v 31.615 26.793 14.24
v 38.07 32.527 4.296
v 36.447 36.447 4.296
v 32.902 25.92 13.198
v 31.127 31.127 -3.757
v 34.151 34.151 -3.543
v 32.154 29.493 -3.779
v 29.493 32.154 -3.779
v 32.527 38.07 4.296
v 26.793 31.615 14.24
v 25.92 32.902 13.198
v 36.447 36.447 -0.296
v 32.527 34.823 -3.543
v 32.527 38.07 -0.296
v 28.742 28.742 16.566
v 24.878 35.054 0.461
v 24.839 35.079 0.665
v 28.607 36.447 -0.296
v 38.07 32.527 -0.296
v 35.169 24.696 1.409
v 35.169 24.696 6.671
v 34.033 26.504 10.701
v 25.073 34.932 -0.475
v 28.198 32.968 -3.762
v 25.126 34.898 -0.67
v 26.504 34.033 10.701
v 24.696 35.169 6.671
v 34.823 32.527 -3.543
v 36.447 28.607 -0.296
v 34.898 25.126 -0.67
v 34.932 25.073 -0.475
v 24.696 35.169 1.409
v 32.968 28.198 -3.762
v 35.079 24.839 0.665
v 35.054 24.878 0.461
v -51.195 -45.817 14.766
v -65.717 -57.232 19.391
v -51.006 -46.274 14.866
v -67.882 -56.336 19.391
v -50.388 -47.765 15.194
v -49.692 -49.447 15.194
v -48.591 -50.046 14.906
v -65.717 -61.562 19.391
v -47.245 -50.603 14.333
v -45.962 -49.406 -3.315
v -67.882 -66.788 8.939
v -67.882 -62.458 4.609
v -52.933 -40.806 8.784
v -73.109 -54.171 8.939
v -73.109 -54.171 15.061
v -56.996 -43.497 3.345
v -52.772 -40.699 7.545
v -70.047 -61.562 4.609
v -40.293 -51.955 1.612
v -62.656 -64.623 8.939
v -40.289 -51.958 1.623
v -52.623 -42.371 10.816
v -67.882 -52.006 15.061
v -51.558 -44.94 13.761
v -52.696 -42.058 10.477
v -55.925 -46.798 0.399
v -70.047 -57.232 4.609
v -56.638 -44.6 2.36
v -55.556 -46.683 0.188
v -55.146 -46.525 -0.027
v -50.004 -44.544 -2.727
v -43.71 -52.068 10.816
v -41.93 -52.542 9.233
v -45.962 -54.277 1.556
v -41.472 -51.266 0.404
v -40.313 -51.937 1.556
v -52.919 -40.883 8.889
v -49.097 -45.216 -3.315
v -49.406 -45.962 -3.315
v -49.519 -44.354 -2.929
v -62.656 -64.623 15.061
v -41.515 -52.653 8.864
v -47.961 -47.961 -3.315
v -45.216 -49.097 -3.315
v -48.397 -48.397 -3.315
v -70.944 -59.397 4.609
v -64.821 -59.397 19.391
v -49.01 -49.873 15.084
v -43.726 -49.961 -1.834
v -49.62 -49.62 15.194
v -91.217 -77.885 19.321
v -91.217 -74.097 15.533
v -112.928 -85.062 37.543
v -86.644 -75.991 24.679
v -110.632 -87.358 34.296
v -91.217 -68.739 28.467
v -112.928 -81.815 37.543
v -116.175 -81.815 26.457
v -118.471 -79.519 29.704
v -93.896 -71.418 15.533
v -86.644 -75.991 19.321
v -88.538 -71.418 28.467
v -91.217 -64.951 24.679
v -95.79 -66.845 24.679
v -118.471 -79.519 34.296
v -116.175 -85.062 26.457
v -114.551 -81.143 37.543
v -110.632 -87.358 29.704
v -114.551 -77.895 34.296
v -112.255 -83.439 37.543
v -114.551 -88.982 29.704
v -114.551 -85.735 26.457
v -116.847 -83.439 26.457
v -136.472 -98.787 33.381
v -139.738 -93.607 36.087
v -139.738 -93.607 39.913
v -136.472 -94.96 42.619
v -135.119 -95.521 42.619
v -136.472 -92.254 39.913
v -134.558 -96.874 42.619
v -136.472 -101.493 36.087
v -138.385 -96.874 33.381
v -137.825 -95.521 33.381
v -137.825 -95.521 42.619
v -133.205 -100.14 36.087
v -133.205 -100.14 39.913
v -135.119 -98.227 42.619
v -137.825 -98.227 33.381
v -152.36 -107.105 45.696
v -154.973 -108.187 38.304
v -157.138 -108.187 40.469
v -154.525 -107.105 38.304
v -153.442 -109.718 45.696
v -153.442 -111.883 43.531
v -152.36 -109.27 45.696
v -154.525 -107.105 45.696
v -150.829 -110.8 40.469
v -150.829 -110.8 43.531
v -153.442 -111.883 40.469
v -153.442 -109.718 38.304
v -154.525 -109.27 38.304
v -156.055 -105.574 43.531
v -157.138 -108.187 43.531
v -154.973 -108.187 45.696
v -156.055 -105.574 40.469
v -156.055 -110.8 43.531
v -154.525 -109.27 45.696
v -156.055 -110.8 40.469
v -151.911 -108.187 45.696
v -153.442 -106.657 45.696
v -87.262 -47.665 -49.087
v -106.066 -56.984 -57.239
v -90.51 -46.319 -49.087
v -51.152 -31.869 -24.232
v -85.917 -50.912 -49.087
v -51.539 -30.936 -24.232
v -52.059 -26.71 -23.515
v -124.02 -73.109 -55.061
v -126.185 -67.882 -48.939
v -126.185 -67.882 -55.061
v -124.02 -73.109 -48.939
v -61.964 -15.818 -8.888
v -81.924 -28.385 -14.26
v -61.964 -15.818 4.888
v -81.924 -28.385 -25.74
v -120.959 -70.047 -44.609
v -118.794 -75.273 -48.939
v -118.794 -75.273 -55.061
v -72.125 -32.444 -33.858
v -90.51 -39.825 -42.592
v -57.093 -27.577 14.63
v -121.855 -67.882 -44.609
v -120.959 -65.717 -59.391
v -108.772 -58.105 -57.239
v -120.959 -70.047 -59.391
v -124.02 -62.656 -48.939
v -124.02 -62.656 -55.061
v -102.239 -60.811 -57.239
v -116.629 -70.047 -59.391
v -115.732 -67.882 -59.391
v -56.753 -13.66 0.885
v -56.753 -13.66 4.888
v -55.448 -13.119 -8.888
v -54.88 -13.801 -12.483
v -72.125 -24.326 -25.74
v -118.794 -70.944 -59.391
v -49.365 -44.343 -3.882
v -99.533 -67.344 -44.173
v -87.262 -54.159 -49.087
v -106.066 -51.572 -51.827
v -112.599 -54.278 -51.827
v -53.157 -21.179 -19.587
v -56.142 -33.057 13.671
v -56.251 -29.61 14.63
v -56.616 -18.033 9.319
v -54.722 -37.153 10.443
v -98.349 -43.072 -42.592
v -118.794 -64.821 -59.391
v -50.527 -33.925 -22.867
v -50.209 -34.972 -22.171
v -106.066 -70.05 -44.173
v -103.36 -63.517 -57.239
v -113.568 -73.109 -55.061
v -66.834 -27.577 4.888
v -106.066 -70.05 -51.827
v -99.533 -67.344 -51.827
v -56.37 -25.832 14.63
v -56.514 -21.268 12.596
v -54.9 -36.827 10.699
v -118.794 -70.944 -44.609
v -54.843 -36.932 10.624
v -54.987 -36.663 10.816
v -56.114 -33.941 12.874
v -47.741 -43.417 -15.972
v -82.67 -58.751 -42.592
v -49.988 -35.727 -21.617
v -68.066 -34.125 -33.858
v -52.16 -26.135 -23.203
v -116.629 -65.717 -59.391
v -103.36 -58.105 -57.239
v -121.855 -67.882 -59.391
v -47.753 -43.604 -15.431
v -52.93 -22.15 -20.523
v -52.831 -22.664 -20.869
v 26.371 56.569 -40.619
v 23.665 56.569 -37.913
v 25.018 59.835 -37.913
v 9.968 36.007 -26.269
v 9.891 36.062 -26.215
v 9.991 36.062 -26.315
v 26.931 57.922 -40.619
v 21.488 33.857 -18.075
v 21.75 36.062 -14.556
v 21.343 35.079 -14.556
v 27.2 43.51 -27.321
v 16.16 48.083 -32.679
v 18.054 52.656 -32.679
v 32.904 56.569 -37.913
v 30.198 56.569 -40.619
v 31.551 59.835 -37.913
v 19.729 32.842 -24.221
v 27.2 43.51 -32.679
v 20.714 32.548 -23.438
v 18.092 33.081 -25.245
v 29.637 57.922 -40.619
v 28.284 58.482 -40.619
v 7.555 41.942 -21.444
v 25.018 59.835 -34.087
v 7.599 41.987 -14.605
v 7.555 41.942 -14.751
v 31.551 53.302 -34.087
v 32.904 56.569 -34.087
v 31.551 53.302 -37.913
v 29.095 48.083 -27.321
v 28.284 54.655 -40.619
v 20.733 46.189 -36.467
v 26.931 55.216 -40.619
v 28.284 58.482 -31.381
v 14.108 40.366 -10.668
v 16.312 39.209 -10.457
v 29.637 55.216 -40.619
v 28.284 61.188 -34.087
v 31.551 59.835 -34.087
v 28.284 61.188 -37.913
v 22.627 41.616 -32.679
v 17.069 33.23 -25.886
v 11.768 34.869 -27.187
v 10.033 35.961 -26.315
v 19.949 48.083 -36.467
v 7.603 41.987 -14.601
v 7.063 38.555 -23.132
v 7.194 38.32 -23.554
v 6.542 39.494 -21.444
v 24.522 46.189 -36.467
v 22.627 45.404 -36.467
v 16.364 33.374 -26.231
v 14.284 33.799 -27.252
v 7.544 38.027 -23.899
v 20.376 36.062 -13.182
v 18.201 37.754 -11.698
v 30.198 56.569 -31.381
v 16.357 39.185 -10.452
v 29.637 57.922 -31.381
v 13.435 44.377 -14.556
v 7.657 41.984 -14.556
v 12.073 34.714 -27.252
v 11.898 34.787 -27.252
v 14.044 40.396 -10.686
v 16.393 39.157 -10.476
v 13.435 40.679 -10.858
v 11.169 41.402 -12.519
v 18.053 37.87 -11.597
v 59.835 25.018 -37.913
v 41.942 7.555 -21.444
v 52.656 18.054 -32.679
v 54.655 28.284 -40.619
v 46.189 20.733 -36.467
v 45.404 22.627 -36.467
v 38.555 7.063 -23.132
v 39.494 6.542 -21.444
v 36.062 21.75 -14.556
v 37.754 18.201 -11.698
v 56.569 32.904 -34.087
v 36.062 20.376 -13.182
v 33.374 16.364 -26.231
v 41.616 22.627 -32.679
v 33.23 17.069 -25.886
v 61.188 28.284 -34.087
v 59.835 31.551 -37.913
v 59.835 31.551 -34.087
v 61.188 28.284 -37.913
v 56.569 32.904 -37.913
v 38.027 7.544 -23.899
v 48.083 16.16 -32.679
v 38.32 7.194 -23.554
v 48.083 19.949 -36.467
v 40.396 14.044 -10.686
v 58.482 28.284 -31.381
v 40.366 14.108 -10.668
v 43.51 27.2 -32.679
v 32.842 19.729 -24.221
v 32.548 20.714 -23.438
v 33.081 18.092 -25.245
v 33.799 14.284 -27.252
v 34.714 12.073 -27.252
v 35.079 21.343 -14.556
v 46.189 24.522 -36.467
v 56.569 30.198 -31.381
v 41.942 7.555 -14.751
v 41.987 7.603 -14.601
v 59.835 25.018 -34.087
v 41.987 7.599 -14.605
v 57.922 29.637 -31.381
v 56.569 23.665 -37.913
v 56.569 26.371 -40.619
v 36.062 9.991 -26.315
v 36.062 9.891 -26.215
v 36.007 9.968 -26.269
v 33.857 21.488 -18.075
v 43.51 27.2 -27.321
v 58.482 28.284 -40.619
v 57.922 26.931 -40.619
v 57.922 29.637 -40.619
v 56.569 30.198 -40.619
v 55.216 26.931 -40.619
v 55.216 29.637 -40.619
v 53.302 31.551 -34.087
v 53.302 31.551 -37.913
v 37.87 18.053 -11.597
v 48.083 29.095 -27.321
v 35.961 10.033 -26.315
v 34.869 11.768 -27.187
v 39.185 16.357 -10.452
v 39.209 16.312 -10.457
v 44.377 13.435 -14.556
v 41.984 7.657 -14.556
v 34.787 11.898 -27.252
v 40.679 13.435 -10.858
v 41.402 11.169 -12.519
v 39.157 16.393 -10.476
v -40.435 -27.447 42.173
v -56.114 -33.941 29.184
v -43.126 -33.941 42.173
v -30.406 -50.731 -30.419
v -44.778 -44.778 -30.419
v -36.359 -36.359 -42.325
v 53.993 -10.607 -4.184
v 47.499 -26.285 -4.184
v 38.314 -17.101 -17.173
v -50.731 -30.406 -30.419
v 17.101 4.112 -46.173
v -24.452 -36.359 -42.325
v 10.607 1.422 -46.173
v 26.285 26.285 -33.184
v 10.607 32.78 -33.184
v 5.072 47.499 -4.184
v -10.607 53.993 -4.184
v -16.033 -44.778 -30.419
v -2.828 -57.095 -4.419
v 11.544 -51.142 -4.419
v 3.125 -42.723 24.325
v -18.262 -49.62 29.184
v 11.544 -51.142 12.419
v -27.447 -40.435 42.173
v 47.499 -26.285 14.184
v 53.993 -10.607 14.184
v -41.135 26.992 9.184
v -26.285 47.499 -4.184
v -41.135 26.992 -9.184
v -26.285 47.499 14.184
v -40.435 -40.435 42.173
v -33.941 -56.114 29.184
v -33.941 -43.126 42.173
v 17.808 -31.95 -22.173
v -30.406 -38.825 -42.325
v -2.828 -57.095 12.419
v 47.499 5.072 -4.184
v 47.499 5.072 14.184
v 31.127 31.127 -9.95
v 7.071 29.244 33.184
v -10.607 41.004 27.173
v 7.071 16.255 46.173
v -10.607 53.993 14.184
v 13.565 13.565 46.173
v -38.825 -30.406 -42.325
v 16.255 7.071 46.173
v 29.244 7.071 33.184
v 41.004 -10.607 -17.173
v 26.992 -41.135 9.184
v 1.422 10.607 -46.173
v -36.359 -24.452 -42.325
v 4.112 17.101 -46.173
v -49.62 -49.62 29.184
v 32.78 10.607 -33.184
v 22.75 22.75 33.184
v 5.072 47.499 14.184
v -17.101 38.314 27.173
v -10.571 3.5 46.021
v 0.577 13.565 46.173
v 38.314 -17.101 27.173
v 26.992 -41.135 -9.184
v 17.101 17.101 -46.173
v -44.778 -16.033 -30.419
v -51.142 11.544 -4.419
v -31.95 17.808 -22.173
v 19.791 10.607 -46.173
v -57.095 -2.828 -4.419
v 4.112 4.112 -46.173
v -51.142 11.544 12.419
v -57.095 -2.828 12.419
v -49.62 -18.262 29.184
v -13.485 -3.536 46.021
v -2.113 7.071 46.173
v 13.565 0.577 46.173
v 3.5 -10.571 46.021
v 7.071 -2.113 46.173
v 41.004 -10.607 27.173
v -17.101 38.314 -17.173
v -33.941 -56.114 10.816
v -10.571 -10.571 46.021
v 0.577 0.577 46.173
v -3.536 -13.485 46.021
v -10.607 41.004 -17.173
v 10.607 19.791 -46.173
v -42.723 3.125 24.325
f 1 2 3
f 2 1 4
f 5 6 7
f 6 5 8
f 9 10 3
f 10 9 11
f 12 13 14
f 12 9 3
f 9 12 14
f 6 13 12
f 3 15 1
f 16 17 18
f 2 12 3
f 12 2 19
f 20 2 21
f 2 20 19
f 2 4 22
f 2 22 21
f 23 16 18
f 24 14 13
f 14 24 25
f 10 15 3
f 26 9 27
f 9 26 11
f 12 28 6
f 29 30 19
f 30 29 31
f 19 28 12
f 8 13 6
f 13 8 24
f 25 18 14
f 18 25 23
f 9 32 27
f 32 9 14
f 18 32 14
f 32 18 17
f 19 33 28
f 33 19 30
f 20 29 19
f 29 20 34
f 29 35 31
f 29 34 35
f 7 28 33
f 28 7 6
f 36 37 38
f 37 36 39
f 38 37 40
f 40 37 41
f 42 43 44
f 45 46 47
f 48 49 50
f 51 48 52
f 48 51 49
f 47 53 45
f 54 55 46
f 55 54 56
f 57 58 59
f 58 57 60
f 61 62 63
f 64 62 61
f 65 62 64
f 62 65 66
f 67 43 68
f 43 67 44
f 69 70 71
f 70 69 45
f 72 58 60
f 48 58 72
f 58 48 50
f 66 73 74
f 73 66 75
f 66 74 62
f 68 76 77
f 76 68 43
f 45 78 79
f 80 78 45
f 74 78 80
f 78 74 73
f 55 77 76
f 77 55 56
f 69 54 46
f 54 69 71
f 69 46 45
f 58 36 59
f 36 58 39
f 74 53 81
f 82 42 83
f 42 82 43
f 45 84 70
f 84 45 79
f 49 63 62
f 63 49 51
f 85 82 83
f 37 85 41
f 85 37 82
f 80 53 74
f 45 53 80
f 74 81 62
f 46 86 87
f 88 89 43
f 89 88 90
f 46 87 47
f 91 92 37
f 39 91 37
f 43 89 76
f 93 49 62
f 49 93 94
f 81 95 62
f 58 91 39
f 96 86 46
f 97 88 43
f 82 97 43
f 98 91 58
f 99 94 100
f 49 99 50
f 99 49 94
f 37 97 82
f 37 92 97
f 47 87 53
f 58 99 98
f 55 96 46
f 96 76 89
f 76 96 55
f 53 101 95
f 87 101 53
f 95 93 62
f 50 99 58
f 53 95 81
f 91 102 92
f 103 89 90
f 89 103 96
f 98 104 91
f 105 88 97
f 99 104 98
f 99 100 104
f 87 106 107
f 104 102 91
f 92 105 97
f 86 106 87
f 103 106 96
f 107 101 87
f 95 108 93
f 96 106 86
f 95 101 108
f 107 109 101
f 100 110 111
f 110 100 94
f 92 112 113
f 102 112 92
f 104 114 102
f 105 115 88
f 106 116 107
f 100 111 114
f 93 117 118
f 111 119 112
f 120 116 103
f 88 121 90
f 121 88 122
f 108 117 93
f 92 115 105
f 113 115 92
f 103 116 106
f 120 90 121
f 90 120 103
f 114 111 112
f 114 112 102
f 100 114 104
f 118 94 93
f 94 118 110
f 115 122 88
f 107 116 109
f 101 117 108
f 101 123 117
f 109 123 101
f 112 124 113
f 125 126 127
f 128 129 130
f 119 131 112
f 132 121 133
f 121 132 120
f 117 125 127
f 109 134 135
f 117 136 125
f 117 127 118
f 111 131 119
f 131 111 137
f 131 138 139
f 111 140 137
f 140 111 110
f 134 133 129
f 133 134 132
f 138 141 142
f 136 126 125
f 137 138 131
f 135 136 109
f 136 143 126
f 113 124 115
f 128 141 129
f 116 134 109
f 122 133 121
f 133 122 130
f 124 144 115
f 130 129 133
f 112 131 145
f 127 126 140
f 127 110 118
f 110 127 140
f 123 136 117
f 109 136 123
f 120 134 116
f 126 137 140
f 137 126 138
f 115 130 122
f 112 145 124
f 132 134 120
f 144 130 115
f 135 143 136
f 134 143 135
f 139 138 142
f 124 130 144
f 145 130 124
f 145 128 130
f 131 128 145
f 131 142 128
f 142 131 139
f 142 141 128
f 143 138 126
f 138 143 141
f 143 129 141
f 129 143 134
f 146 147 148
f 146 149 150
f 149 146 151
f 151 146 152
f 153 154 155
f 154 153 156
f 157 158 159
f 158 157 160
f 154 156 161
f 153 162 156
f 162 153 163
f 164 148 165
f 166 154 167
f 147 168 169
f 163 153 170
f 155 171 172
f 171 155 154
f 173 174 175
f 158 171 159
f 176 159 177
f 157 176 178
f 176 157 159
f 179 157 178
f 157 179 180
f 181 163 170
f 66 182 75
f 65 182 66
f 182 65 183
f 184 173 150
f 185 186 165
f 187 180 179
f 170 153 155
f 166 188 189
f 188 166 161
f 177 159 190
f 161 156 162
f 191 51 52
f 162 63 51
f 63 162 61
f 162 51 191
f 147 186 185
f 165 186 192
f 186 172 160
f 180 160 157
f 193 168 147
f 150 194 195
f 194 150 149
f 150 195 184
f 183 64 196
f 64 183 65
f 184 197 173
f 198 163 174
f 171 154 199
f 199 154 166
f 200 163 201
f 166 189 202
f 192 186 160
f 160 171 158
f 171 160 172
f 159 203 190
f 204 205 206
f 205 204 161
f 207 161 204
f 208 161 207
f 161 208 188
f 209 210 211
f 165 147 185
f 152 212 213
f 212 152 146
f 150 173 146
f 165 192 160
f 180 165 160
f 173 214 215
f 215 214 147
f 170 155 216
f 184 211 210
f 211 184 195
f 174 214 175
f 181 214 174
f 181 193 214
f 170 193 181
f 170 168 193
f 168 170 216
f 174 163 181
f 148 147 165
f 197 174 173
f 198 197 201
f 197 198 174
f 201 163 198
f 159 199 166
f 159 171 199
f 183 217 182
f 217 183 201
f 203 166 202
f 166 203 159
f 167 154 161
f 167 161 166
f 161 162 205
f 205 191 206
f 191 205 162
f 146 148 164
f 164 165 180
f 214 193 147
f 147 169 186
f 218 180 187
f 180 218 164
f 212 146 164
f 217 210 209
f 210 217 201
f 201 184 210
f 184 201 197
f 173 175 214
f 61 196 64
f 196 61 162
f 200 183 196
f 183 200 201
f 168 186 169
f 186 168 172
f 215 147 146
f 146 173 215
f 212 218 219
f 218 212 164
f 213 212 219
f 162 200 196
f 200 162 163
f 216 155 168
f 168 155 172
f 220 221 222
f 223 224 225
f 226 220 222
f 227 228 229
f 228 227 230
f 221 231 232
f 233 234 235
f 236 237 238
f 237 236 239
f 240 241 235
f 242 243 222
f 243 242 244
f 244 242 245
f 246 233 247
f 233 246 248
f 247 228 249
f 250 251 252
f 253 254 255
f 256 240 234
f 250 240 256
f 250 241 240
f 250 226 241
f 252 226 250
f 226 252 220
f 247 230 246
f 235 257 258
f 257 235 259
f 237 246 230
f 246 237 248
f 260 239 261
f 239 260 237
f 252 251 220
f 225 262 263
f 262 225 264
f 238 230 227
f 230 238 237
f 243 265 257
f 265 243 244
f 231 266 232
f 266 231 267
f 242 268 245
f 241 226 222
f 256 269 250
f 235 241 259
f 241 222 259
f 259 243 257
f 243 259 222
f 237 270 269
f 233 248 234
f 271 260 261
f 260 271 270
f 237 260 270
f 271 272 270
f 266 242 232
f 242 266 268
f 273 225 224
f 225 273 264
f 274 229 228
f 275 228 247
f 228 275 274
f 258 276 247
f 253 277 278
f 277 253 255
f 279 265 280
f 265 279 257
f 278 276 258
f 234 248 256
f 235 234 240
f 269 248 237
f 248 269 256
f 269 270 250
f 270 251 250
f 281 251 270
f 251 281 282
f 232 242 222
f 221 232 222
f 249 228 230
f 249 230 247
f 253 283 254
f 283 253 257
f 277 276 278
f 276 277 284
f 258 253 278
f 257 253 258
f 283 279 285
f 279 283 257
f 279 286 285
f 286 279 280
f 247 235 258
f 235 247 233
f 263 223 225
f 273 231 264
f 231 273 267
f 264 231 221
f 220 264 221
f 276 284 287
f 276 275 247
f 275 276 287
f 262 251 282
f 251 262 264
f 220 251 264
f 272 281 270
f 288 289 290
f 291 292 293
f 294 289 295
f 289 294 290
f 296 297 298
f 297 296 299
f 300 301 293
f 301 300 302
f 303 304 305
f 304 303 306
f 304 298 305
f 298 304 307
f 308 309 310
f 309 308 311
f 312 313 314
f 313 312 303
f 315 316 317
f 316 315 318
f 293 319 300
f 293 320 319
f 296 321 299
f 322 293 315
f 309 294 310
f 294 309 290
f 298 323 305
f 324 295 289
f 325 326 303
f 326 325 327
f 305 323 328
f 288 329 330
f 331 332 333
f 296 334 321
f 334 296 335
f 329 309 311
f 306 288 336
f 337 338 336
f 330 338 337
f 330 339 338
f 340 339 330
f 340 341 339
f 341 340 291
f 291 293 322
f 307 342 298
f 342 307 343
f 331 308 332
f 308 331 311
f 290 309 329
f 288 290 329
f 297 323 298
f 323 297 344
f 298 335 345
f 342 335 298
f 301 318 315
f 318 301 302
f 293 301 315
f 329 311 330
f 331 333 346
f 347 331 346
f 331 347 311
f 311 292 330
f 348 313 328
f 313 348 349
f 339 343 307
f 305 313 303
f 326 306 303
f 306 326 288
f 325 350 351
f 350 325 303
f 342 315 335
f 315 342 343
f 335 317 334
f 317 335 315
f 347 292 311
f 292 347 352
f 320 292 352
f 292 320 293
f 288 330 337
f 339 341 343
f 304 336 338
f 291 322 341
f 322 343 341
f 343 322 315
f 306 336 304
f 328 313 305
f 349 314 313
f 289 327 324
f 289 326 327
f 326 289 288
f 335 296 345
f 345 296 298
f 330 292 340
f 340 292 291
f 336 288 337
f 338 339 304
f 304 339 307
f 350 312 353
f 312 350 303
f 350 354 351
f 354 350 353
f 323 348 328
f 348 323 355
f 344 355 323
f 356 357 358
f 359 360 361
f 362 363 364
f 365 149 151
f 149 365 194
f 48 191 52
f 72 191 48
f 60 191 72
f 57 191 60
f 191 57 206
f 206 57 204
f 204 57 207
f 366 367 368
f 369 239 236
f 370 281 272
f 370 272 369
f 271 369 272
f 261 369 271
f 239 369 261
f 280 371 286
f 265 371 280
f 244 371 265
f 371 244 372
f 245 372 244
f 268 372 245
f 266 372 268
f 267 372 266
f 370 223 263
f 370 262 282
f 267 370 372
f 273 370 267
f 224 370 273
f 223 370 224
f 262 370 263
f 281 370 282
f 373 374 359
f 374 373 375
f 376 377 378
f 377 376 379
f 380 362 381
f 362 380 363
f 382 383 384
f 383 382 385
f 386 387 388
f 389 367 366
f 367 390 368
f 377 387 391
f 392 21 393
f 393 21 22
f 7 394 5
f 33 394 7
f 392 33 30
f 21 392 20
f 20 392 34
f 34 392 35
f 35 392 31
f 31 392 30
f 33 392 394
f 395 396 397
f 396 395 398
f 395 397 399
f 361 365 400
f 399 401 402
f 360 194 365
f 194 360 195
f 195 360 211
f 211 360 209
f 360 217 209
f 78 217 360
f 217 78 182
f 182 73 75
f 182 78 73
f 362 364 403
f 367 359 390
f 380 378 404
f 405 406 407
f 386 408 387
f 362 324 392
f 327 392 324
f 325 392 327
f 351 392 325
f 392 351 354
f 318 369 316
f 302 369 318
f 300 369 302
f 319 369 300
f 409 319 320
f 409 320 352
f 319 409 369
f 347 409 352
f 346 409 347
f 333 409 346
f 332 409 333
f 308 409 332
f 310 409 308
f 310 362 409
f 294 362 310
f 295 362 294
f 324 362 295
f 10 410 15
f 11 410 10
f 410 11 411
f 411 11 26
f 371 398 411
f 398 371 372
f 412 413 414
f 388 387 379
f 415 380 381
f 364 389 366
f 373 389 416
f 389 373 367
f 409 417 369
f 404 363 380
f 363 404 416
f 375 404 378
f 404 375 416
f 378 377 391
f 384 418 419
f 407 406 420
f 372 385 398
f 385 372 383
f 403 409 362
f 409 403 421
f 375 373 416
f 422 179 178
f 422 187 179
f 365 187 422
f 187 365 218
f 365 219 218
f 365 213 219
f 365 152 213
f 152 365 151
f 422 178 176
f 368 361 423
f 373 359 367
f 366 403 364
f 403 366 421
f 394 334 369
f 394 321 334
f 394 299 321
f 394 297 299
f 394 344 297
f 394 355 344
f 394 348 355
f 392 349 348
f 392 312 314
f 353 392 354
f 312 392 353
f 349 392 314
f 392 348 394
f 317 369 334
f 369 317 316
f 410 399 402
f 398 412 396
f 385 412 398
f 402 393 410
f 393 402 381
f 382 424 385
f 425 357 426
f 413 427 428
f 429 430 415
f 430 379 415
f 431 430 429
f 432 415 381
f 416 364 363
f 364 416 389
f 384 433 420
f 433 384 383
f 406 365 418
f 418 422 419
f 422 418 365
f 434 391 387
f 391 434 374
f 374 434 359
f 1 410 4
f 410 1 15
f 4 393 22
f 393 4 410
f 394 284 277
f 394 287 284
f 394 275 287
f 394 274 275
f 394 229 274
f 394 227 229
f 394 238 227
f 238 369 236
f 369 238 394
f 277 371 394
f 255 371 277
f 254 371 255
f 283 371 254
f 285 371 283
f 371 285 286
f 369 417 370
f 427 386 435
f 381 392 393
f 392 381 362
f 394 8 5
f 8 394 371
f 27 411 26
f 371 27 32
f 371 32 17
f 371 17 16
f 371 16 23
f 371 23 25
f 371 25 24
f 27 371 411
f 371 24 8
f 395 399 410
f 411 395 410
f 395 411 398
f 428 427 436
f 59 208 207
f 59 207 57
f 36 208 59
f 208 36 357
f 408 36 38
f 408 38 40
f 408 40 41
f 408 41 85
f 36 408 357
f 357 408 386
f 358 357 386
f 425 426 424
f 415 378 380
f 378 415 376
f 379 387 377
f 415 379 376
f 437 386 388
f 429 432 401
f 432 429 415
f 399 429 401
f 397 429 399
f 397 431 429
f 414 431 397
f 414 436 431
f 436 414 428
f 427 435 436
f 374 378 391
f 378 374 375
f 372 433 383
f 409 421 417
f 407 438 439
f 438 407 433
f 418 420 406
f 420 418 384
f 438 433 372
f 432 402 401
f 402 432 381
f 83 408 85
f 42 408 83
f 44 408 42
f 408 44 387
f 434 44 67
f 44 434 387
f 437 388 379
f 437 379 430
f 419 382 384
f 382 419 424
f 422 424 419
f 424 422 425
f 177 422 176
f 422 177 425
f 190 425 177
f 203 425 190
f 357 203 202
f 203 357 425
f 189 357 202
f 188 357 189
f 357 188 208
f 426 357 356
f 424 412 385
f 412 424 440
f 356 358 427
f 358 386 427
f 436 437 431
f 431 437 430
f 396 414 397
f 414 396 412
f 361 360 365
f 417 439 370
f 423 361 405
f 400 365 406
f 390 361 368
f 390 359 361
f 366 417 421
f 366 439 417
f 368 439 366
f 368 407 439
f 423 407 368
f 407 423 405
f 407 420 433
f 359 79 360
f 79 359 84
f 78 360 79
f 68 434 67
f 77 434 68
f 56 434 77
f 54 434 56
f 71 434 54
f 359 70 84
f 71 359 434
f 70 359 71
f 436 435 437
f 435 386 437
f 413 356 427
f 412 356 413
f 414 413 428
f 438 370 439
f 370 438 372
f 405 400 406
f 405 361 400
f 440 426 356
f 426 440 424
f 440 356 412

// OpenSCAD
// ==========================================
// Parametric Low-Poly Leaping Quadruped Assembly
// ==========================================

$fn = 8; // low-poly sculptural facets

// -- Overall pose --
pose_z = 45; // diagonal orientation in XY plane

// -- Head shell dimensions --
head_nose_x = 42;
ear_base = 12;
ear_height = 15;
nose_r = 2.3;
nose_h = 2.1;
eye_r = 3.2;

// -- Body core dimensions --
body_front_x = 20;
body_rear_x = -48;
body_half_width = 30;
body_top_z = 28;
body_bottom_z = -28;

// -- Ornamental figurine: tail & limbs --
tail_start = [-65, 0, 5];
tail_pts = [
    [-90, 6, 12],
    [-115, 14, 22],
    [-140, 22, 32],
    [-165, 28, 38],
    [-185, 32, 42]
];
tail_r_start = 9;
tail_r_end = 4;

rear_leg = [
    [-55, 16, -2],
    [-78, 24, -20],
    [-100, 28, -38],
    [-118, 32, -48],
    [-132, 36, -52]
];

front_paw_l = [
    [35, 16, -18],
    [50, 18, -30],
    [60, 20, -36]
];
front_paw_r = [
    [35, -16, -18],
    [50, -18, -30],
    [60, -20, -36]
];

// -- Unnamed part (inferred lower jaw) --
jaw_x = head_nose_x - 14;

// ==========================================
// Modules
// ==========================================

module pointed_ear(base, height) {
    b = base;
    h = height;
    polyhedron(
        points = [
            [0, -b/2, 0],
            [0, b/2, 0],
            [b*0.6, 0, 0],
            [b*0.2, 0, h]
        ],
        faces = [
            [0, 1, 2],
            [0, 2, 3],
            [2, 1, 3],
            [1, 0, 3]
        ]
    );
}

module sculptural_head_shell() {
    nx = head_nose_x;
    difference() {
        union() {
            // Cranium, snout and cheeks
            hull() {
                translate([nx - 26, 0, 10]) sphere(12);
                translate([nx - 22, 0, 20]) sphere(10);
                translate([nx - 24, 10, 9]) sphere(9);
                translate([nx - 24, -10, 9]) sphere(9);
                translate([nx - 14, 0, 18]) sphere(9);
                translate([nx - 6, 0, 6]) sphere(9);
                translate([nx, 0, 3]) sphere(7);
                translate([nx + 4, 0, 2]) sphere(6);
                translate([nx - 16, 8, 1]) sphere(6);
                translate([nx - 16, -8, 1]) sphere(6);
            }
            // Ears
            translate([nx - 20, 9, 22]) rotate([10, 0, 25]) pointed_ear(ear_base, ear_height);
            translate([nx - 20, -9, 22]) rotate([10, 0, -25]) pointed_ear(ear_base, ear_height);
            // Cylindrical nose tip
            translate([nx + 6, 0, 2]) rotate([0, 90, 0]) cylinder(h = nose_h, r = nose_r);
        }
        // Eye indentations
        translate([nx - 12, 10, 10]) sphere(eye_r);
        translate([nx - 12, -10, 10]) sphere(eye_r);
    }
}

module unnamed_part() {
    // Inferred lower jaw / chin piece
    jx = jaw_x;
    hull() {
        translate([jx - 8, 0, -6]) sphere(5);
        translate([jx + 2, 0, -5]) sphere(5);
        translate([jx + 10, 0, -4]) sphere(4);
        translate([jx - 4, 6, -5]) sphere(4);
        translate([jx - 4, -6, -5]) sphere(4);
    }
}

module figurine_body() {
    fx = body_front_x;
    rx = body_rear_x;
    hw = body_half_width;
    tz = body_top_z;
    bz = body_bottom_z;
    // Compact near-cubic torso
    hull() {
        translate([fx, 0, 0]) sphere(26);
        translate([fx - 5, hw, 5]) sphere(24);
        translate([fx - 5, -hw, 5]) sphere(24);
        translate([fx - 10, 0, tz - 4]) sphere(24);
        translate([fx - 5, 0, bz + 4]) sphere(24);
        translate([-5, 0, tz - 6]) sphere(26);
        translate([-10, hw - 4, 0]) sphere(24);
        translate([-10, -hw + 4, 0]) sphere(24);
        translate([rx + 15, 0, 8]) sphere(26);
        translate([rx + 20, hw - 6, 4]) sphere(22);
        translate([rx + 20, -hw + 6, 4]) sphere(22);
        translate([rx, 0, tz - 8]) sphere(24);
        translate([rx + 5, 0, bz + 6]) sphere(22);
    }
}

module ornamental_figurine() {
    // Long curved tail
    all_tail = concat([tail_start], tail_pts);
    n = len(all_tail);
    for (i = [0 : n - 2]) {
        r1 = tail_r_start - (tail_r_start - tail_r_end) * i / (n - 1);
        r2 = tail_r_start - (tail_r_start - tail_r_end) * (i + 1) / (n - 1);
        hull() {
            translate(all_tail[i]) sphere(r1);
            translate(all_tail[i+1]) sphere(r2);
        }
    }
    
    // Rear leg and foot
    hull() {
        translate(rear_leg[0]) sphere(18);
        translate(rear_leg[1]) sphere(15);
        translate(rear_leg[2]) sphere(12);
        translate(rear_leg[3]) sphere(10);
        translate(rear_leg[4]) sphere(8);
    }
    
    // Front paws
    hull() {
        translate(front_paw_l[0]) sphere(9);
        translate(front_paw_l[1]) sphere(7);
        translate(front_paw_l[2]) sphere(5);
    }
    hull() {
        translate(front_paw_r[0]) sphere(9);
        translate(front_paw_r[1]) sphere(7);
        translate(front_paw_r[2]) sphere(5);
    }
}

// ==========================================
// Assembly
// ==========================================

module quadruped() {
    sculptural_head_shell();
    unnamed_part();
    figurine_body();
    ornamental_figurine();
}

rotate([0, 0, pose_z])
quadruped();
